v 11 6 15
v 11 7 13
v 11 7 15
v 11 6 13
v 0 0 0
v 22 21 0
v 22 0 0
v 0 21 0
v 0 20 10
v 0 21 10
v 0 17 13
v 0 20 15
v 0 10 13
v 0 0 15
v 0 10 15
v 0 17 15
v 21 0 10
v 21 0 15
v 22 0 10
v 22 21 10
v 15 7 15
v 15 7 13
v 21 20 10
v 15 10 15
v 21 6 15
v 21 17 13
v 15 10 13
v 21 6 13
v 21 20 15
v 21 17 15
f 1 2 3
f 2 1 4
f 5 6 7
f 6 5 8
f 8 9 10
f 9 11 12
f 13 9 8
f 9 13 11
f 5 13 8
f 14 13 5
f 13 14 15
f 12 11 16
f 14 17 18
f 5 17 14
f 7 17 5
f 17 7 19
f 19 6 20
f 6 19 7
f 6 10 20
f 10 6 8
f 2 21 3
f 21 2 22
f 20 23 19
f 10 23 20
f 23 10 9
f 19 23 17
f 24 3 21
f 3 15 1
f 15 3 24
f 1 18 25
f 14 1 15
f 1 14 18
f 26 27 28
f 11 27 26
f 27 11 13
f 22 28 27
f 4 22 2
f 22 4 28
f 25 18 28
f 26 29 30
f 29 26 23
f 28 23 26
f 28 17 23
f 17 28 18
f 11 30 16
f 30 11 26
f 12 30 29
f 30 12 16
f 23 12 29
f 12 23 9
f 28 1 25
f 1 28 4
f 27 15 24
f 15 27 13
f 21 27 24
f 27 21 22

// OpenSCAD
translate([5.5, 3.5, 2.5]) color([0.31903016062772993, 0.53590115499306, 0.8934753784920533]) cube([11, 7, 5], center=true);
translate([16.5, 3.5, 2.5]) color([0.25549985489866966, 0.5219903070058861, 0.1901317713313112]) cube([11, 7, 5], center=true);
translate([5.5, 10.5, 2.5]) color([0.08011594570868696, 0.8699478397109702, 0.3457472114844995]) cube([11, 7, 5], center=true);
translate([16.5, 10.5, 2.5]) color([0.837290862214726, 0.25127706432840136, 0.7290260027021367]) cube([11, 7, 5], center=true);
translate([5.5, 17.5, 2.5]) color([0.3013213449137814, 0.5169005458056509, 0.38467176448284957]) cube([11, 7, 5], center=true);
translate([16.5, 17.5, 2.5]) color([0.4820846642847386, 0.8719757028853922, 0.2399620044566907]) cube([11, 7, 5], center=true);
translate([5.5, 3.5, 7.5]) color([0.3058147052987177, 0.5519737755681405, 0.009208459116004764]) cube([11, 7, 5], center=true);
translate([16.5, 3.5, 7.5]) color([0.4953005367860557, 0.43819859659275806, 0.9171481192782721]) cube([11, 7, 5], center=true);
translate([5.5, 10.5, 7.5]) color([0.41212019308576986, 0.49358197644734136, 0.44010860560926524]) cube([11, 7, 5], center=true);
translate([16.5, 10.5, 7.5]) color([0.0856157398333921, 0.2411443971002879, 0.8262650576639278]) cube([11, 7, 5], center=true);
translate([5.5, 17.5, 7.5]) color([0.15379567752788093, 0.8842528530898255, 0.2134665283608419]) cube([11, 7, 5], center=true);
translate([16.5, 17.5, 7.5]) color([0.6127566924478359, 0.818008657000479, 0.5590112191053322]) cube([11, 7, 5], center=true);
translate([5.5, 3.5, 12.5]) color([0.8866043301622452, 0.39447102725022787, 0.9589163376419946]) cube([11, 7, 5], center=true);
translate([13.5, 3.5, 11.5]) color([0.24972819156954773, 0.22005049979750413, 0.8404590105346786]) cube([5, 7, 3], center=true);
translate([18.5, 3.5, 11.5]) color([0.2789960200671917, 0.35210354864297055, 0.9946691500756418]) cube([5, 7, 3], center=true);
translate([3.5, 9.5, 11.5]) color([0.10728537706325991, 0.8996256313138141, 0.6100819970747507]) cube([7, 5, 3], center=true);
translate([10.5, 9.5, 11.5]) color([0.7890377134172993, 0.7110679469752405, 0.7774643558396669]) cube([7, 5, 3], center=true);
translate([17.5, 9.5, 11.5]) color([0.5140354678382717, 0.46207744282607, 0.6343562920465169]) cube([7, 5, 3], center=true);
translate([3.5, 14.5, 11.5]) color([0.27254621857246664, 0.016558424522952975, 0.6148716567717017]) cube([7, 5, 3], center=true);
translate([10.5, 14.5, 11.5]) color([0.7119066573597548, 0.17257617960039529, 0.41465974039415787]) cube([7, 5, 3], center=true);
translate([17.5, 14.5, 11.5]) color([0.21806470516739018, 0.8797884787327306, 0.9971497033508181]) cube([7, 5, 3], center=true);
translate([3.5, 18.5, 12.5]) color([0.006439244314443648, 0.5355241113549698, 0.428269623660265]) cube([7, 3, 5], center=true);
translate([10.5, 18.5, 12.5]) color([0.0497703561320445, 0.3846945959716809, 0.27248481749180187]) cube([7, 3, 5], center=true);
translate([17.5, 18.5, 12.5]) color([0.9711494351721061, 0.5646669518865992, 0.22956269737245216]) cube([7, 3, 5], center=true);
translate([13.5, 1.5, 14.0]) color([0.7165492601952248, 0.5466375027642284, 0.2821670936164109]) cube([5, 3, 2], center=true);
translate([18.5, 1.5, 14.0]) color([0.7398695784196249, 0.9015687423954613, 0.06478718309218656]) cube([5, 3, 2], center=true);
translate([13.5, 4.5, 14.0]) color([0.3075184499818515, 0.32730937178137276, 0.373196919474838]) cube([5, 3, 2], center=true);
translate([18.5, 4.5, 14.0]) color([0.48026967262350795, 0.5820603979481933, 0.1372879505883815]) cube([5, 3, 2], center=true);
translate([2.5, 8.5, 14.0]) color([0.015498761483451418, 0.5048497045627587, 0.36698725510709684]) cube([5, 3, 2], center=true);
translate([7.5, 8.5, 14.0]) color([0.6348155217266559, 0.811995686067811, 0.8768405645756486]) cube([5, 3, 2], center=true);
translate([12.5, 8.5, 14.0]) color([0.1552431358080847, 0.1767648869043179, 0.991228648099722]) cube([5, 3, 2], center=true);
